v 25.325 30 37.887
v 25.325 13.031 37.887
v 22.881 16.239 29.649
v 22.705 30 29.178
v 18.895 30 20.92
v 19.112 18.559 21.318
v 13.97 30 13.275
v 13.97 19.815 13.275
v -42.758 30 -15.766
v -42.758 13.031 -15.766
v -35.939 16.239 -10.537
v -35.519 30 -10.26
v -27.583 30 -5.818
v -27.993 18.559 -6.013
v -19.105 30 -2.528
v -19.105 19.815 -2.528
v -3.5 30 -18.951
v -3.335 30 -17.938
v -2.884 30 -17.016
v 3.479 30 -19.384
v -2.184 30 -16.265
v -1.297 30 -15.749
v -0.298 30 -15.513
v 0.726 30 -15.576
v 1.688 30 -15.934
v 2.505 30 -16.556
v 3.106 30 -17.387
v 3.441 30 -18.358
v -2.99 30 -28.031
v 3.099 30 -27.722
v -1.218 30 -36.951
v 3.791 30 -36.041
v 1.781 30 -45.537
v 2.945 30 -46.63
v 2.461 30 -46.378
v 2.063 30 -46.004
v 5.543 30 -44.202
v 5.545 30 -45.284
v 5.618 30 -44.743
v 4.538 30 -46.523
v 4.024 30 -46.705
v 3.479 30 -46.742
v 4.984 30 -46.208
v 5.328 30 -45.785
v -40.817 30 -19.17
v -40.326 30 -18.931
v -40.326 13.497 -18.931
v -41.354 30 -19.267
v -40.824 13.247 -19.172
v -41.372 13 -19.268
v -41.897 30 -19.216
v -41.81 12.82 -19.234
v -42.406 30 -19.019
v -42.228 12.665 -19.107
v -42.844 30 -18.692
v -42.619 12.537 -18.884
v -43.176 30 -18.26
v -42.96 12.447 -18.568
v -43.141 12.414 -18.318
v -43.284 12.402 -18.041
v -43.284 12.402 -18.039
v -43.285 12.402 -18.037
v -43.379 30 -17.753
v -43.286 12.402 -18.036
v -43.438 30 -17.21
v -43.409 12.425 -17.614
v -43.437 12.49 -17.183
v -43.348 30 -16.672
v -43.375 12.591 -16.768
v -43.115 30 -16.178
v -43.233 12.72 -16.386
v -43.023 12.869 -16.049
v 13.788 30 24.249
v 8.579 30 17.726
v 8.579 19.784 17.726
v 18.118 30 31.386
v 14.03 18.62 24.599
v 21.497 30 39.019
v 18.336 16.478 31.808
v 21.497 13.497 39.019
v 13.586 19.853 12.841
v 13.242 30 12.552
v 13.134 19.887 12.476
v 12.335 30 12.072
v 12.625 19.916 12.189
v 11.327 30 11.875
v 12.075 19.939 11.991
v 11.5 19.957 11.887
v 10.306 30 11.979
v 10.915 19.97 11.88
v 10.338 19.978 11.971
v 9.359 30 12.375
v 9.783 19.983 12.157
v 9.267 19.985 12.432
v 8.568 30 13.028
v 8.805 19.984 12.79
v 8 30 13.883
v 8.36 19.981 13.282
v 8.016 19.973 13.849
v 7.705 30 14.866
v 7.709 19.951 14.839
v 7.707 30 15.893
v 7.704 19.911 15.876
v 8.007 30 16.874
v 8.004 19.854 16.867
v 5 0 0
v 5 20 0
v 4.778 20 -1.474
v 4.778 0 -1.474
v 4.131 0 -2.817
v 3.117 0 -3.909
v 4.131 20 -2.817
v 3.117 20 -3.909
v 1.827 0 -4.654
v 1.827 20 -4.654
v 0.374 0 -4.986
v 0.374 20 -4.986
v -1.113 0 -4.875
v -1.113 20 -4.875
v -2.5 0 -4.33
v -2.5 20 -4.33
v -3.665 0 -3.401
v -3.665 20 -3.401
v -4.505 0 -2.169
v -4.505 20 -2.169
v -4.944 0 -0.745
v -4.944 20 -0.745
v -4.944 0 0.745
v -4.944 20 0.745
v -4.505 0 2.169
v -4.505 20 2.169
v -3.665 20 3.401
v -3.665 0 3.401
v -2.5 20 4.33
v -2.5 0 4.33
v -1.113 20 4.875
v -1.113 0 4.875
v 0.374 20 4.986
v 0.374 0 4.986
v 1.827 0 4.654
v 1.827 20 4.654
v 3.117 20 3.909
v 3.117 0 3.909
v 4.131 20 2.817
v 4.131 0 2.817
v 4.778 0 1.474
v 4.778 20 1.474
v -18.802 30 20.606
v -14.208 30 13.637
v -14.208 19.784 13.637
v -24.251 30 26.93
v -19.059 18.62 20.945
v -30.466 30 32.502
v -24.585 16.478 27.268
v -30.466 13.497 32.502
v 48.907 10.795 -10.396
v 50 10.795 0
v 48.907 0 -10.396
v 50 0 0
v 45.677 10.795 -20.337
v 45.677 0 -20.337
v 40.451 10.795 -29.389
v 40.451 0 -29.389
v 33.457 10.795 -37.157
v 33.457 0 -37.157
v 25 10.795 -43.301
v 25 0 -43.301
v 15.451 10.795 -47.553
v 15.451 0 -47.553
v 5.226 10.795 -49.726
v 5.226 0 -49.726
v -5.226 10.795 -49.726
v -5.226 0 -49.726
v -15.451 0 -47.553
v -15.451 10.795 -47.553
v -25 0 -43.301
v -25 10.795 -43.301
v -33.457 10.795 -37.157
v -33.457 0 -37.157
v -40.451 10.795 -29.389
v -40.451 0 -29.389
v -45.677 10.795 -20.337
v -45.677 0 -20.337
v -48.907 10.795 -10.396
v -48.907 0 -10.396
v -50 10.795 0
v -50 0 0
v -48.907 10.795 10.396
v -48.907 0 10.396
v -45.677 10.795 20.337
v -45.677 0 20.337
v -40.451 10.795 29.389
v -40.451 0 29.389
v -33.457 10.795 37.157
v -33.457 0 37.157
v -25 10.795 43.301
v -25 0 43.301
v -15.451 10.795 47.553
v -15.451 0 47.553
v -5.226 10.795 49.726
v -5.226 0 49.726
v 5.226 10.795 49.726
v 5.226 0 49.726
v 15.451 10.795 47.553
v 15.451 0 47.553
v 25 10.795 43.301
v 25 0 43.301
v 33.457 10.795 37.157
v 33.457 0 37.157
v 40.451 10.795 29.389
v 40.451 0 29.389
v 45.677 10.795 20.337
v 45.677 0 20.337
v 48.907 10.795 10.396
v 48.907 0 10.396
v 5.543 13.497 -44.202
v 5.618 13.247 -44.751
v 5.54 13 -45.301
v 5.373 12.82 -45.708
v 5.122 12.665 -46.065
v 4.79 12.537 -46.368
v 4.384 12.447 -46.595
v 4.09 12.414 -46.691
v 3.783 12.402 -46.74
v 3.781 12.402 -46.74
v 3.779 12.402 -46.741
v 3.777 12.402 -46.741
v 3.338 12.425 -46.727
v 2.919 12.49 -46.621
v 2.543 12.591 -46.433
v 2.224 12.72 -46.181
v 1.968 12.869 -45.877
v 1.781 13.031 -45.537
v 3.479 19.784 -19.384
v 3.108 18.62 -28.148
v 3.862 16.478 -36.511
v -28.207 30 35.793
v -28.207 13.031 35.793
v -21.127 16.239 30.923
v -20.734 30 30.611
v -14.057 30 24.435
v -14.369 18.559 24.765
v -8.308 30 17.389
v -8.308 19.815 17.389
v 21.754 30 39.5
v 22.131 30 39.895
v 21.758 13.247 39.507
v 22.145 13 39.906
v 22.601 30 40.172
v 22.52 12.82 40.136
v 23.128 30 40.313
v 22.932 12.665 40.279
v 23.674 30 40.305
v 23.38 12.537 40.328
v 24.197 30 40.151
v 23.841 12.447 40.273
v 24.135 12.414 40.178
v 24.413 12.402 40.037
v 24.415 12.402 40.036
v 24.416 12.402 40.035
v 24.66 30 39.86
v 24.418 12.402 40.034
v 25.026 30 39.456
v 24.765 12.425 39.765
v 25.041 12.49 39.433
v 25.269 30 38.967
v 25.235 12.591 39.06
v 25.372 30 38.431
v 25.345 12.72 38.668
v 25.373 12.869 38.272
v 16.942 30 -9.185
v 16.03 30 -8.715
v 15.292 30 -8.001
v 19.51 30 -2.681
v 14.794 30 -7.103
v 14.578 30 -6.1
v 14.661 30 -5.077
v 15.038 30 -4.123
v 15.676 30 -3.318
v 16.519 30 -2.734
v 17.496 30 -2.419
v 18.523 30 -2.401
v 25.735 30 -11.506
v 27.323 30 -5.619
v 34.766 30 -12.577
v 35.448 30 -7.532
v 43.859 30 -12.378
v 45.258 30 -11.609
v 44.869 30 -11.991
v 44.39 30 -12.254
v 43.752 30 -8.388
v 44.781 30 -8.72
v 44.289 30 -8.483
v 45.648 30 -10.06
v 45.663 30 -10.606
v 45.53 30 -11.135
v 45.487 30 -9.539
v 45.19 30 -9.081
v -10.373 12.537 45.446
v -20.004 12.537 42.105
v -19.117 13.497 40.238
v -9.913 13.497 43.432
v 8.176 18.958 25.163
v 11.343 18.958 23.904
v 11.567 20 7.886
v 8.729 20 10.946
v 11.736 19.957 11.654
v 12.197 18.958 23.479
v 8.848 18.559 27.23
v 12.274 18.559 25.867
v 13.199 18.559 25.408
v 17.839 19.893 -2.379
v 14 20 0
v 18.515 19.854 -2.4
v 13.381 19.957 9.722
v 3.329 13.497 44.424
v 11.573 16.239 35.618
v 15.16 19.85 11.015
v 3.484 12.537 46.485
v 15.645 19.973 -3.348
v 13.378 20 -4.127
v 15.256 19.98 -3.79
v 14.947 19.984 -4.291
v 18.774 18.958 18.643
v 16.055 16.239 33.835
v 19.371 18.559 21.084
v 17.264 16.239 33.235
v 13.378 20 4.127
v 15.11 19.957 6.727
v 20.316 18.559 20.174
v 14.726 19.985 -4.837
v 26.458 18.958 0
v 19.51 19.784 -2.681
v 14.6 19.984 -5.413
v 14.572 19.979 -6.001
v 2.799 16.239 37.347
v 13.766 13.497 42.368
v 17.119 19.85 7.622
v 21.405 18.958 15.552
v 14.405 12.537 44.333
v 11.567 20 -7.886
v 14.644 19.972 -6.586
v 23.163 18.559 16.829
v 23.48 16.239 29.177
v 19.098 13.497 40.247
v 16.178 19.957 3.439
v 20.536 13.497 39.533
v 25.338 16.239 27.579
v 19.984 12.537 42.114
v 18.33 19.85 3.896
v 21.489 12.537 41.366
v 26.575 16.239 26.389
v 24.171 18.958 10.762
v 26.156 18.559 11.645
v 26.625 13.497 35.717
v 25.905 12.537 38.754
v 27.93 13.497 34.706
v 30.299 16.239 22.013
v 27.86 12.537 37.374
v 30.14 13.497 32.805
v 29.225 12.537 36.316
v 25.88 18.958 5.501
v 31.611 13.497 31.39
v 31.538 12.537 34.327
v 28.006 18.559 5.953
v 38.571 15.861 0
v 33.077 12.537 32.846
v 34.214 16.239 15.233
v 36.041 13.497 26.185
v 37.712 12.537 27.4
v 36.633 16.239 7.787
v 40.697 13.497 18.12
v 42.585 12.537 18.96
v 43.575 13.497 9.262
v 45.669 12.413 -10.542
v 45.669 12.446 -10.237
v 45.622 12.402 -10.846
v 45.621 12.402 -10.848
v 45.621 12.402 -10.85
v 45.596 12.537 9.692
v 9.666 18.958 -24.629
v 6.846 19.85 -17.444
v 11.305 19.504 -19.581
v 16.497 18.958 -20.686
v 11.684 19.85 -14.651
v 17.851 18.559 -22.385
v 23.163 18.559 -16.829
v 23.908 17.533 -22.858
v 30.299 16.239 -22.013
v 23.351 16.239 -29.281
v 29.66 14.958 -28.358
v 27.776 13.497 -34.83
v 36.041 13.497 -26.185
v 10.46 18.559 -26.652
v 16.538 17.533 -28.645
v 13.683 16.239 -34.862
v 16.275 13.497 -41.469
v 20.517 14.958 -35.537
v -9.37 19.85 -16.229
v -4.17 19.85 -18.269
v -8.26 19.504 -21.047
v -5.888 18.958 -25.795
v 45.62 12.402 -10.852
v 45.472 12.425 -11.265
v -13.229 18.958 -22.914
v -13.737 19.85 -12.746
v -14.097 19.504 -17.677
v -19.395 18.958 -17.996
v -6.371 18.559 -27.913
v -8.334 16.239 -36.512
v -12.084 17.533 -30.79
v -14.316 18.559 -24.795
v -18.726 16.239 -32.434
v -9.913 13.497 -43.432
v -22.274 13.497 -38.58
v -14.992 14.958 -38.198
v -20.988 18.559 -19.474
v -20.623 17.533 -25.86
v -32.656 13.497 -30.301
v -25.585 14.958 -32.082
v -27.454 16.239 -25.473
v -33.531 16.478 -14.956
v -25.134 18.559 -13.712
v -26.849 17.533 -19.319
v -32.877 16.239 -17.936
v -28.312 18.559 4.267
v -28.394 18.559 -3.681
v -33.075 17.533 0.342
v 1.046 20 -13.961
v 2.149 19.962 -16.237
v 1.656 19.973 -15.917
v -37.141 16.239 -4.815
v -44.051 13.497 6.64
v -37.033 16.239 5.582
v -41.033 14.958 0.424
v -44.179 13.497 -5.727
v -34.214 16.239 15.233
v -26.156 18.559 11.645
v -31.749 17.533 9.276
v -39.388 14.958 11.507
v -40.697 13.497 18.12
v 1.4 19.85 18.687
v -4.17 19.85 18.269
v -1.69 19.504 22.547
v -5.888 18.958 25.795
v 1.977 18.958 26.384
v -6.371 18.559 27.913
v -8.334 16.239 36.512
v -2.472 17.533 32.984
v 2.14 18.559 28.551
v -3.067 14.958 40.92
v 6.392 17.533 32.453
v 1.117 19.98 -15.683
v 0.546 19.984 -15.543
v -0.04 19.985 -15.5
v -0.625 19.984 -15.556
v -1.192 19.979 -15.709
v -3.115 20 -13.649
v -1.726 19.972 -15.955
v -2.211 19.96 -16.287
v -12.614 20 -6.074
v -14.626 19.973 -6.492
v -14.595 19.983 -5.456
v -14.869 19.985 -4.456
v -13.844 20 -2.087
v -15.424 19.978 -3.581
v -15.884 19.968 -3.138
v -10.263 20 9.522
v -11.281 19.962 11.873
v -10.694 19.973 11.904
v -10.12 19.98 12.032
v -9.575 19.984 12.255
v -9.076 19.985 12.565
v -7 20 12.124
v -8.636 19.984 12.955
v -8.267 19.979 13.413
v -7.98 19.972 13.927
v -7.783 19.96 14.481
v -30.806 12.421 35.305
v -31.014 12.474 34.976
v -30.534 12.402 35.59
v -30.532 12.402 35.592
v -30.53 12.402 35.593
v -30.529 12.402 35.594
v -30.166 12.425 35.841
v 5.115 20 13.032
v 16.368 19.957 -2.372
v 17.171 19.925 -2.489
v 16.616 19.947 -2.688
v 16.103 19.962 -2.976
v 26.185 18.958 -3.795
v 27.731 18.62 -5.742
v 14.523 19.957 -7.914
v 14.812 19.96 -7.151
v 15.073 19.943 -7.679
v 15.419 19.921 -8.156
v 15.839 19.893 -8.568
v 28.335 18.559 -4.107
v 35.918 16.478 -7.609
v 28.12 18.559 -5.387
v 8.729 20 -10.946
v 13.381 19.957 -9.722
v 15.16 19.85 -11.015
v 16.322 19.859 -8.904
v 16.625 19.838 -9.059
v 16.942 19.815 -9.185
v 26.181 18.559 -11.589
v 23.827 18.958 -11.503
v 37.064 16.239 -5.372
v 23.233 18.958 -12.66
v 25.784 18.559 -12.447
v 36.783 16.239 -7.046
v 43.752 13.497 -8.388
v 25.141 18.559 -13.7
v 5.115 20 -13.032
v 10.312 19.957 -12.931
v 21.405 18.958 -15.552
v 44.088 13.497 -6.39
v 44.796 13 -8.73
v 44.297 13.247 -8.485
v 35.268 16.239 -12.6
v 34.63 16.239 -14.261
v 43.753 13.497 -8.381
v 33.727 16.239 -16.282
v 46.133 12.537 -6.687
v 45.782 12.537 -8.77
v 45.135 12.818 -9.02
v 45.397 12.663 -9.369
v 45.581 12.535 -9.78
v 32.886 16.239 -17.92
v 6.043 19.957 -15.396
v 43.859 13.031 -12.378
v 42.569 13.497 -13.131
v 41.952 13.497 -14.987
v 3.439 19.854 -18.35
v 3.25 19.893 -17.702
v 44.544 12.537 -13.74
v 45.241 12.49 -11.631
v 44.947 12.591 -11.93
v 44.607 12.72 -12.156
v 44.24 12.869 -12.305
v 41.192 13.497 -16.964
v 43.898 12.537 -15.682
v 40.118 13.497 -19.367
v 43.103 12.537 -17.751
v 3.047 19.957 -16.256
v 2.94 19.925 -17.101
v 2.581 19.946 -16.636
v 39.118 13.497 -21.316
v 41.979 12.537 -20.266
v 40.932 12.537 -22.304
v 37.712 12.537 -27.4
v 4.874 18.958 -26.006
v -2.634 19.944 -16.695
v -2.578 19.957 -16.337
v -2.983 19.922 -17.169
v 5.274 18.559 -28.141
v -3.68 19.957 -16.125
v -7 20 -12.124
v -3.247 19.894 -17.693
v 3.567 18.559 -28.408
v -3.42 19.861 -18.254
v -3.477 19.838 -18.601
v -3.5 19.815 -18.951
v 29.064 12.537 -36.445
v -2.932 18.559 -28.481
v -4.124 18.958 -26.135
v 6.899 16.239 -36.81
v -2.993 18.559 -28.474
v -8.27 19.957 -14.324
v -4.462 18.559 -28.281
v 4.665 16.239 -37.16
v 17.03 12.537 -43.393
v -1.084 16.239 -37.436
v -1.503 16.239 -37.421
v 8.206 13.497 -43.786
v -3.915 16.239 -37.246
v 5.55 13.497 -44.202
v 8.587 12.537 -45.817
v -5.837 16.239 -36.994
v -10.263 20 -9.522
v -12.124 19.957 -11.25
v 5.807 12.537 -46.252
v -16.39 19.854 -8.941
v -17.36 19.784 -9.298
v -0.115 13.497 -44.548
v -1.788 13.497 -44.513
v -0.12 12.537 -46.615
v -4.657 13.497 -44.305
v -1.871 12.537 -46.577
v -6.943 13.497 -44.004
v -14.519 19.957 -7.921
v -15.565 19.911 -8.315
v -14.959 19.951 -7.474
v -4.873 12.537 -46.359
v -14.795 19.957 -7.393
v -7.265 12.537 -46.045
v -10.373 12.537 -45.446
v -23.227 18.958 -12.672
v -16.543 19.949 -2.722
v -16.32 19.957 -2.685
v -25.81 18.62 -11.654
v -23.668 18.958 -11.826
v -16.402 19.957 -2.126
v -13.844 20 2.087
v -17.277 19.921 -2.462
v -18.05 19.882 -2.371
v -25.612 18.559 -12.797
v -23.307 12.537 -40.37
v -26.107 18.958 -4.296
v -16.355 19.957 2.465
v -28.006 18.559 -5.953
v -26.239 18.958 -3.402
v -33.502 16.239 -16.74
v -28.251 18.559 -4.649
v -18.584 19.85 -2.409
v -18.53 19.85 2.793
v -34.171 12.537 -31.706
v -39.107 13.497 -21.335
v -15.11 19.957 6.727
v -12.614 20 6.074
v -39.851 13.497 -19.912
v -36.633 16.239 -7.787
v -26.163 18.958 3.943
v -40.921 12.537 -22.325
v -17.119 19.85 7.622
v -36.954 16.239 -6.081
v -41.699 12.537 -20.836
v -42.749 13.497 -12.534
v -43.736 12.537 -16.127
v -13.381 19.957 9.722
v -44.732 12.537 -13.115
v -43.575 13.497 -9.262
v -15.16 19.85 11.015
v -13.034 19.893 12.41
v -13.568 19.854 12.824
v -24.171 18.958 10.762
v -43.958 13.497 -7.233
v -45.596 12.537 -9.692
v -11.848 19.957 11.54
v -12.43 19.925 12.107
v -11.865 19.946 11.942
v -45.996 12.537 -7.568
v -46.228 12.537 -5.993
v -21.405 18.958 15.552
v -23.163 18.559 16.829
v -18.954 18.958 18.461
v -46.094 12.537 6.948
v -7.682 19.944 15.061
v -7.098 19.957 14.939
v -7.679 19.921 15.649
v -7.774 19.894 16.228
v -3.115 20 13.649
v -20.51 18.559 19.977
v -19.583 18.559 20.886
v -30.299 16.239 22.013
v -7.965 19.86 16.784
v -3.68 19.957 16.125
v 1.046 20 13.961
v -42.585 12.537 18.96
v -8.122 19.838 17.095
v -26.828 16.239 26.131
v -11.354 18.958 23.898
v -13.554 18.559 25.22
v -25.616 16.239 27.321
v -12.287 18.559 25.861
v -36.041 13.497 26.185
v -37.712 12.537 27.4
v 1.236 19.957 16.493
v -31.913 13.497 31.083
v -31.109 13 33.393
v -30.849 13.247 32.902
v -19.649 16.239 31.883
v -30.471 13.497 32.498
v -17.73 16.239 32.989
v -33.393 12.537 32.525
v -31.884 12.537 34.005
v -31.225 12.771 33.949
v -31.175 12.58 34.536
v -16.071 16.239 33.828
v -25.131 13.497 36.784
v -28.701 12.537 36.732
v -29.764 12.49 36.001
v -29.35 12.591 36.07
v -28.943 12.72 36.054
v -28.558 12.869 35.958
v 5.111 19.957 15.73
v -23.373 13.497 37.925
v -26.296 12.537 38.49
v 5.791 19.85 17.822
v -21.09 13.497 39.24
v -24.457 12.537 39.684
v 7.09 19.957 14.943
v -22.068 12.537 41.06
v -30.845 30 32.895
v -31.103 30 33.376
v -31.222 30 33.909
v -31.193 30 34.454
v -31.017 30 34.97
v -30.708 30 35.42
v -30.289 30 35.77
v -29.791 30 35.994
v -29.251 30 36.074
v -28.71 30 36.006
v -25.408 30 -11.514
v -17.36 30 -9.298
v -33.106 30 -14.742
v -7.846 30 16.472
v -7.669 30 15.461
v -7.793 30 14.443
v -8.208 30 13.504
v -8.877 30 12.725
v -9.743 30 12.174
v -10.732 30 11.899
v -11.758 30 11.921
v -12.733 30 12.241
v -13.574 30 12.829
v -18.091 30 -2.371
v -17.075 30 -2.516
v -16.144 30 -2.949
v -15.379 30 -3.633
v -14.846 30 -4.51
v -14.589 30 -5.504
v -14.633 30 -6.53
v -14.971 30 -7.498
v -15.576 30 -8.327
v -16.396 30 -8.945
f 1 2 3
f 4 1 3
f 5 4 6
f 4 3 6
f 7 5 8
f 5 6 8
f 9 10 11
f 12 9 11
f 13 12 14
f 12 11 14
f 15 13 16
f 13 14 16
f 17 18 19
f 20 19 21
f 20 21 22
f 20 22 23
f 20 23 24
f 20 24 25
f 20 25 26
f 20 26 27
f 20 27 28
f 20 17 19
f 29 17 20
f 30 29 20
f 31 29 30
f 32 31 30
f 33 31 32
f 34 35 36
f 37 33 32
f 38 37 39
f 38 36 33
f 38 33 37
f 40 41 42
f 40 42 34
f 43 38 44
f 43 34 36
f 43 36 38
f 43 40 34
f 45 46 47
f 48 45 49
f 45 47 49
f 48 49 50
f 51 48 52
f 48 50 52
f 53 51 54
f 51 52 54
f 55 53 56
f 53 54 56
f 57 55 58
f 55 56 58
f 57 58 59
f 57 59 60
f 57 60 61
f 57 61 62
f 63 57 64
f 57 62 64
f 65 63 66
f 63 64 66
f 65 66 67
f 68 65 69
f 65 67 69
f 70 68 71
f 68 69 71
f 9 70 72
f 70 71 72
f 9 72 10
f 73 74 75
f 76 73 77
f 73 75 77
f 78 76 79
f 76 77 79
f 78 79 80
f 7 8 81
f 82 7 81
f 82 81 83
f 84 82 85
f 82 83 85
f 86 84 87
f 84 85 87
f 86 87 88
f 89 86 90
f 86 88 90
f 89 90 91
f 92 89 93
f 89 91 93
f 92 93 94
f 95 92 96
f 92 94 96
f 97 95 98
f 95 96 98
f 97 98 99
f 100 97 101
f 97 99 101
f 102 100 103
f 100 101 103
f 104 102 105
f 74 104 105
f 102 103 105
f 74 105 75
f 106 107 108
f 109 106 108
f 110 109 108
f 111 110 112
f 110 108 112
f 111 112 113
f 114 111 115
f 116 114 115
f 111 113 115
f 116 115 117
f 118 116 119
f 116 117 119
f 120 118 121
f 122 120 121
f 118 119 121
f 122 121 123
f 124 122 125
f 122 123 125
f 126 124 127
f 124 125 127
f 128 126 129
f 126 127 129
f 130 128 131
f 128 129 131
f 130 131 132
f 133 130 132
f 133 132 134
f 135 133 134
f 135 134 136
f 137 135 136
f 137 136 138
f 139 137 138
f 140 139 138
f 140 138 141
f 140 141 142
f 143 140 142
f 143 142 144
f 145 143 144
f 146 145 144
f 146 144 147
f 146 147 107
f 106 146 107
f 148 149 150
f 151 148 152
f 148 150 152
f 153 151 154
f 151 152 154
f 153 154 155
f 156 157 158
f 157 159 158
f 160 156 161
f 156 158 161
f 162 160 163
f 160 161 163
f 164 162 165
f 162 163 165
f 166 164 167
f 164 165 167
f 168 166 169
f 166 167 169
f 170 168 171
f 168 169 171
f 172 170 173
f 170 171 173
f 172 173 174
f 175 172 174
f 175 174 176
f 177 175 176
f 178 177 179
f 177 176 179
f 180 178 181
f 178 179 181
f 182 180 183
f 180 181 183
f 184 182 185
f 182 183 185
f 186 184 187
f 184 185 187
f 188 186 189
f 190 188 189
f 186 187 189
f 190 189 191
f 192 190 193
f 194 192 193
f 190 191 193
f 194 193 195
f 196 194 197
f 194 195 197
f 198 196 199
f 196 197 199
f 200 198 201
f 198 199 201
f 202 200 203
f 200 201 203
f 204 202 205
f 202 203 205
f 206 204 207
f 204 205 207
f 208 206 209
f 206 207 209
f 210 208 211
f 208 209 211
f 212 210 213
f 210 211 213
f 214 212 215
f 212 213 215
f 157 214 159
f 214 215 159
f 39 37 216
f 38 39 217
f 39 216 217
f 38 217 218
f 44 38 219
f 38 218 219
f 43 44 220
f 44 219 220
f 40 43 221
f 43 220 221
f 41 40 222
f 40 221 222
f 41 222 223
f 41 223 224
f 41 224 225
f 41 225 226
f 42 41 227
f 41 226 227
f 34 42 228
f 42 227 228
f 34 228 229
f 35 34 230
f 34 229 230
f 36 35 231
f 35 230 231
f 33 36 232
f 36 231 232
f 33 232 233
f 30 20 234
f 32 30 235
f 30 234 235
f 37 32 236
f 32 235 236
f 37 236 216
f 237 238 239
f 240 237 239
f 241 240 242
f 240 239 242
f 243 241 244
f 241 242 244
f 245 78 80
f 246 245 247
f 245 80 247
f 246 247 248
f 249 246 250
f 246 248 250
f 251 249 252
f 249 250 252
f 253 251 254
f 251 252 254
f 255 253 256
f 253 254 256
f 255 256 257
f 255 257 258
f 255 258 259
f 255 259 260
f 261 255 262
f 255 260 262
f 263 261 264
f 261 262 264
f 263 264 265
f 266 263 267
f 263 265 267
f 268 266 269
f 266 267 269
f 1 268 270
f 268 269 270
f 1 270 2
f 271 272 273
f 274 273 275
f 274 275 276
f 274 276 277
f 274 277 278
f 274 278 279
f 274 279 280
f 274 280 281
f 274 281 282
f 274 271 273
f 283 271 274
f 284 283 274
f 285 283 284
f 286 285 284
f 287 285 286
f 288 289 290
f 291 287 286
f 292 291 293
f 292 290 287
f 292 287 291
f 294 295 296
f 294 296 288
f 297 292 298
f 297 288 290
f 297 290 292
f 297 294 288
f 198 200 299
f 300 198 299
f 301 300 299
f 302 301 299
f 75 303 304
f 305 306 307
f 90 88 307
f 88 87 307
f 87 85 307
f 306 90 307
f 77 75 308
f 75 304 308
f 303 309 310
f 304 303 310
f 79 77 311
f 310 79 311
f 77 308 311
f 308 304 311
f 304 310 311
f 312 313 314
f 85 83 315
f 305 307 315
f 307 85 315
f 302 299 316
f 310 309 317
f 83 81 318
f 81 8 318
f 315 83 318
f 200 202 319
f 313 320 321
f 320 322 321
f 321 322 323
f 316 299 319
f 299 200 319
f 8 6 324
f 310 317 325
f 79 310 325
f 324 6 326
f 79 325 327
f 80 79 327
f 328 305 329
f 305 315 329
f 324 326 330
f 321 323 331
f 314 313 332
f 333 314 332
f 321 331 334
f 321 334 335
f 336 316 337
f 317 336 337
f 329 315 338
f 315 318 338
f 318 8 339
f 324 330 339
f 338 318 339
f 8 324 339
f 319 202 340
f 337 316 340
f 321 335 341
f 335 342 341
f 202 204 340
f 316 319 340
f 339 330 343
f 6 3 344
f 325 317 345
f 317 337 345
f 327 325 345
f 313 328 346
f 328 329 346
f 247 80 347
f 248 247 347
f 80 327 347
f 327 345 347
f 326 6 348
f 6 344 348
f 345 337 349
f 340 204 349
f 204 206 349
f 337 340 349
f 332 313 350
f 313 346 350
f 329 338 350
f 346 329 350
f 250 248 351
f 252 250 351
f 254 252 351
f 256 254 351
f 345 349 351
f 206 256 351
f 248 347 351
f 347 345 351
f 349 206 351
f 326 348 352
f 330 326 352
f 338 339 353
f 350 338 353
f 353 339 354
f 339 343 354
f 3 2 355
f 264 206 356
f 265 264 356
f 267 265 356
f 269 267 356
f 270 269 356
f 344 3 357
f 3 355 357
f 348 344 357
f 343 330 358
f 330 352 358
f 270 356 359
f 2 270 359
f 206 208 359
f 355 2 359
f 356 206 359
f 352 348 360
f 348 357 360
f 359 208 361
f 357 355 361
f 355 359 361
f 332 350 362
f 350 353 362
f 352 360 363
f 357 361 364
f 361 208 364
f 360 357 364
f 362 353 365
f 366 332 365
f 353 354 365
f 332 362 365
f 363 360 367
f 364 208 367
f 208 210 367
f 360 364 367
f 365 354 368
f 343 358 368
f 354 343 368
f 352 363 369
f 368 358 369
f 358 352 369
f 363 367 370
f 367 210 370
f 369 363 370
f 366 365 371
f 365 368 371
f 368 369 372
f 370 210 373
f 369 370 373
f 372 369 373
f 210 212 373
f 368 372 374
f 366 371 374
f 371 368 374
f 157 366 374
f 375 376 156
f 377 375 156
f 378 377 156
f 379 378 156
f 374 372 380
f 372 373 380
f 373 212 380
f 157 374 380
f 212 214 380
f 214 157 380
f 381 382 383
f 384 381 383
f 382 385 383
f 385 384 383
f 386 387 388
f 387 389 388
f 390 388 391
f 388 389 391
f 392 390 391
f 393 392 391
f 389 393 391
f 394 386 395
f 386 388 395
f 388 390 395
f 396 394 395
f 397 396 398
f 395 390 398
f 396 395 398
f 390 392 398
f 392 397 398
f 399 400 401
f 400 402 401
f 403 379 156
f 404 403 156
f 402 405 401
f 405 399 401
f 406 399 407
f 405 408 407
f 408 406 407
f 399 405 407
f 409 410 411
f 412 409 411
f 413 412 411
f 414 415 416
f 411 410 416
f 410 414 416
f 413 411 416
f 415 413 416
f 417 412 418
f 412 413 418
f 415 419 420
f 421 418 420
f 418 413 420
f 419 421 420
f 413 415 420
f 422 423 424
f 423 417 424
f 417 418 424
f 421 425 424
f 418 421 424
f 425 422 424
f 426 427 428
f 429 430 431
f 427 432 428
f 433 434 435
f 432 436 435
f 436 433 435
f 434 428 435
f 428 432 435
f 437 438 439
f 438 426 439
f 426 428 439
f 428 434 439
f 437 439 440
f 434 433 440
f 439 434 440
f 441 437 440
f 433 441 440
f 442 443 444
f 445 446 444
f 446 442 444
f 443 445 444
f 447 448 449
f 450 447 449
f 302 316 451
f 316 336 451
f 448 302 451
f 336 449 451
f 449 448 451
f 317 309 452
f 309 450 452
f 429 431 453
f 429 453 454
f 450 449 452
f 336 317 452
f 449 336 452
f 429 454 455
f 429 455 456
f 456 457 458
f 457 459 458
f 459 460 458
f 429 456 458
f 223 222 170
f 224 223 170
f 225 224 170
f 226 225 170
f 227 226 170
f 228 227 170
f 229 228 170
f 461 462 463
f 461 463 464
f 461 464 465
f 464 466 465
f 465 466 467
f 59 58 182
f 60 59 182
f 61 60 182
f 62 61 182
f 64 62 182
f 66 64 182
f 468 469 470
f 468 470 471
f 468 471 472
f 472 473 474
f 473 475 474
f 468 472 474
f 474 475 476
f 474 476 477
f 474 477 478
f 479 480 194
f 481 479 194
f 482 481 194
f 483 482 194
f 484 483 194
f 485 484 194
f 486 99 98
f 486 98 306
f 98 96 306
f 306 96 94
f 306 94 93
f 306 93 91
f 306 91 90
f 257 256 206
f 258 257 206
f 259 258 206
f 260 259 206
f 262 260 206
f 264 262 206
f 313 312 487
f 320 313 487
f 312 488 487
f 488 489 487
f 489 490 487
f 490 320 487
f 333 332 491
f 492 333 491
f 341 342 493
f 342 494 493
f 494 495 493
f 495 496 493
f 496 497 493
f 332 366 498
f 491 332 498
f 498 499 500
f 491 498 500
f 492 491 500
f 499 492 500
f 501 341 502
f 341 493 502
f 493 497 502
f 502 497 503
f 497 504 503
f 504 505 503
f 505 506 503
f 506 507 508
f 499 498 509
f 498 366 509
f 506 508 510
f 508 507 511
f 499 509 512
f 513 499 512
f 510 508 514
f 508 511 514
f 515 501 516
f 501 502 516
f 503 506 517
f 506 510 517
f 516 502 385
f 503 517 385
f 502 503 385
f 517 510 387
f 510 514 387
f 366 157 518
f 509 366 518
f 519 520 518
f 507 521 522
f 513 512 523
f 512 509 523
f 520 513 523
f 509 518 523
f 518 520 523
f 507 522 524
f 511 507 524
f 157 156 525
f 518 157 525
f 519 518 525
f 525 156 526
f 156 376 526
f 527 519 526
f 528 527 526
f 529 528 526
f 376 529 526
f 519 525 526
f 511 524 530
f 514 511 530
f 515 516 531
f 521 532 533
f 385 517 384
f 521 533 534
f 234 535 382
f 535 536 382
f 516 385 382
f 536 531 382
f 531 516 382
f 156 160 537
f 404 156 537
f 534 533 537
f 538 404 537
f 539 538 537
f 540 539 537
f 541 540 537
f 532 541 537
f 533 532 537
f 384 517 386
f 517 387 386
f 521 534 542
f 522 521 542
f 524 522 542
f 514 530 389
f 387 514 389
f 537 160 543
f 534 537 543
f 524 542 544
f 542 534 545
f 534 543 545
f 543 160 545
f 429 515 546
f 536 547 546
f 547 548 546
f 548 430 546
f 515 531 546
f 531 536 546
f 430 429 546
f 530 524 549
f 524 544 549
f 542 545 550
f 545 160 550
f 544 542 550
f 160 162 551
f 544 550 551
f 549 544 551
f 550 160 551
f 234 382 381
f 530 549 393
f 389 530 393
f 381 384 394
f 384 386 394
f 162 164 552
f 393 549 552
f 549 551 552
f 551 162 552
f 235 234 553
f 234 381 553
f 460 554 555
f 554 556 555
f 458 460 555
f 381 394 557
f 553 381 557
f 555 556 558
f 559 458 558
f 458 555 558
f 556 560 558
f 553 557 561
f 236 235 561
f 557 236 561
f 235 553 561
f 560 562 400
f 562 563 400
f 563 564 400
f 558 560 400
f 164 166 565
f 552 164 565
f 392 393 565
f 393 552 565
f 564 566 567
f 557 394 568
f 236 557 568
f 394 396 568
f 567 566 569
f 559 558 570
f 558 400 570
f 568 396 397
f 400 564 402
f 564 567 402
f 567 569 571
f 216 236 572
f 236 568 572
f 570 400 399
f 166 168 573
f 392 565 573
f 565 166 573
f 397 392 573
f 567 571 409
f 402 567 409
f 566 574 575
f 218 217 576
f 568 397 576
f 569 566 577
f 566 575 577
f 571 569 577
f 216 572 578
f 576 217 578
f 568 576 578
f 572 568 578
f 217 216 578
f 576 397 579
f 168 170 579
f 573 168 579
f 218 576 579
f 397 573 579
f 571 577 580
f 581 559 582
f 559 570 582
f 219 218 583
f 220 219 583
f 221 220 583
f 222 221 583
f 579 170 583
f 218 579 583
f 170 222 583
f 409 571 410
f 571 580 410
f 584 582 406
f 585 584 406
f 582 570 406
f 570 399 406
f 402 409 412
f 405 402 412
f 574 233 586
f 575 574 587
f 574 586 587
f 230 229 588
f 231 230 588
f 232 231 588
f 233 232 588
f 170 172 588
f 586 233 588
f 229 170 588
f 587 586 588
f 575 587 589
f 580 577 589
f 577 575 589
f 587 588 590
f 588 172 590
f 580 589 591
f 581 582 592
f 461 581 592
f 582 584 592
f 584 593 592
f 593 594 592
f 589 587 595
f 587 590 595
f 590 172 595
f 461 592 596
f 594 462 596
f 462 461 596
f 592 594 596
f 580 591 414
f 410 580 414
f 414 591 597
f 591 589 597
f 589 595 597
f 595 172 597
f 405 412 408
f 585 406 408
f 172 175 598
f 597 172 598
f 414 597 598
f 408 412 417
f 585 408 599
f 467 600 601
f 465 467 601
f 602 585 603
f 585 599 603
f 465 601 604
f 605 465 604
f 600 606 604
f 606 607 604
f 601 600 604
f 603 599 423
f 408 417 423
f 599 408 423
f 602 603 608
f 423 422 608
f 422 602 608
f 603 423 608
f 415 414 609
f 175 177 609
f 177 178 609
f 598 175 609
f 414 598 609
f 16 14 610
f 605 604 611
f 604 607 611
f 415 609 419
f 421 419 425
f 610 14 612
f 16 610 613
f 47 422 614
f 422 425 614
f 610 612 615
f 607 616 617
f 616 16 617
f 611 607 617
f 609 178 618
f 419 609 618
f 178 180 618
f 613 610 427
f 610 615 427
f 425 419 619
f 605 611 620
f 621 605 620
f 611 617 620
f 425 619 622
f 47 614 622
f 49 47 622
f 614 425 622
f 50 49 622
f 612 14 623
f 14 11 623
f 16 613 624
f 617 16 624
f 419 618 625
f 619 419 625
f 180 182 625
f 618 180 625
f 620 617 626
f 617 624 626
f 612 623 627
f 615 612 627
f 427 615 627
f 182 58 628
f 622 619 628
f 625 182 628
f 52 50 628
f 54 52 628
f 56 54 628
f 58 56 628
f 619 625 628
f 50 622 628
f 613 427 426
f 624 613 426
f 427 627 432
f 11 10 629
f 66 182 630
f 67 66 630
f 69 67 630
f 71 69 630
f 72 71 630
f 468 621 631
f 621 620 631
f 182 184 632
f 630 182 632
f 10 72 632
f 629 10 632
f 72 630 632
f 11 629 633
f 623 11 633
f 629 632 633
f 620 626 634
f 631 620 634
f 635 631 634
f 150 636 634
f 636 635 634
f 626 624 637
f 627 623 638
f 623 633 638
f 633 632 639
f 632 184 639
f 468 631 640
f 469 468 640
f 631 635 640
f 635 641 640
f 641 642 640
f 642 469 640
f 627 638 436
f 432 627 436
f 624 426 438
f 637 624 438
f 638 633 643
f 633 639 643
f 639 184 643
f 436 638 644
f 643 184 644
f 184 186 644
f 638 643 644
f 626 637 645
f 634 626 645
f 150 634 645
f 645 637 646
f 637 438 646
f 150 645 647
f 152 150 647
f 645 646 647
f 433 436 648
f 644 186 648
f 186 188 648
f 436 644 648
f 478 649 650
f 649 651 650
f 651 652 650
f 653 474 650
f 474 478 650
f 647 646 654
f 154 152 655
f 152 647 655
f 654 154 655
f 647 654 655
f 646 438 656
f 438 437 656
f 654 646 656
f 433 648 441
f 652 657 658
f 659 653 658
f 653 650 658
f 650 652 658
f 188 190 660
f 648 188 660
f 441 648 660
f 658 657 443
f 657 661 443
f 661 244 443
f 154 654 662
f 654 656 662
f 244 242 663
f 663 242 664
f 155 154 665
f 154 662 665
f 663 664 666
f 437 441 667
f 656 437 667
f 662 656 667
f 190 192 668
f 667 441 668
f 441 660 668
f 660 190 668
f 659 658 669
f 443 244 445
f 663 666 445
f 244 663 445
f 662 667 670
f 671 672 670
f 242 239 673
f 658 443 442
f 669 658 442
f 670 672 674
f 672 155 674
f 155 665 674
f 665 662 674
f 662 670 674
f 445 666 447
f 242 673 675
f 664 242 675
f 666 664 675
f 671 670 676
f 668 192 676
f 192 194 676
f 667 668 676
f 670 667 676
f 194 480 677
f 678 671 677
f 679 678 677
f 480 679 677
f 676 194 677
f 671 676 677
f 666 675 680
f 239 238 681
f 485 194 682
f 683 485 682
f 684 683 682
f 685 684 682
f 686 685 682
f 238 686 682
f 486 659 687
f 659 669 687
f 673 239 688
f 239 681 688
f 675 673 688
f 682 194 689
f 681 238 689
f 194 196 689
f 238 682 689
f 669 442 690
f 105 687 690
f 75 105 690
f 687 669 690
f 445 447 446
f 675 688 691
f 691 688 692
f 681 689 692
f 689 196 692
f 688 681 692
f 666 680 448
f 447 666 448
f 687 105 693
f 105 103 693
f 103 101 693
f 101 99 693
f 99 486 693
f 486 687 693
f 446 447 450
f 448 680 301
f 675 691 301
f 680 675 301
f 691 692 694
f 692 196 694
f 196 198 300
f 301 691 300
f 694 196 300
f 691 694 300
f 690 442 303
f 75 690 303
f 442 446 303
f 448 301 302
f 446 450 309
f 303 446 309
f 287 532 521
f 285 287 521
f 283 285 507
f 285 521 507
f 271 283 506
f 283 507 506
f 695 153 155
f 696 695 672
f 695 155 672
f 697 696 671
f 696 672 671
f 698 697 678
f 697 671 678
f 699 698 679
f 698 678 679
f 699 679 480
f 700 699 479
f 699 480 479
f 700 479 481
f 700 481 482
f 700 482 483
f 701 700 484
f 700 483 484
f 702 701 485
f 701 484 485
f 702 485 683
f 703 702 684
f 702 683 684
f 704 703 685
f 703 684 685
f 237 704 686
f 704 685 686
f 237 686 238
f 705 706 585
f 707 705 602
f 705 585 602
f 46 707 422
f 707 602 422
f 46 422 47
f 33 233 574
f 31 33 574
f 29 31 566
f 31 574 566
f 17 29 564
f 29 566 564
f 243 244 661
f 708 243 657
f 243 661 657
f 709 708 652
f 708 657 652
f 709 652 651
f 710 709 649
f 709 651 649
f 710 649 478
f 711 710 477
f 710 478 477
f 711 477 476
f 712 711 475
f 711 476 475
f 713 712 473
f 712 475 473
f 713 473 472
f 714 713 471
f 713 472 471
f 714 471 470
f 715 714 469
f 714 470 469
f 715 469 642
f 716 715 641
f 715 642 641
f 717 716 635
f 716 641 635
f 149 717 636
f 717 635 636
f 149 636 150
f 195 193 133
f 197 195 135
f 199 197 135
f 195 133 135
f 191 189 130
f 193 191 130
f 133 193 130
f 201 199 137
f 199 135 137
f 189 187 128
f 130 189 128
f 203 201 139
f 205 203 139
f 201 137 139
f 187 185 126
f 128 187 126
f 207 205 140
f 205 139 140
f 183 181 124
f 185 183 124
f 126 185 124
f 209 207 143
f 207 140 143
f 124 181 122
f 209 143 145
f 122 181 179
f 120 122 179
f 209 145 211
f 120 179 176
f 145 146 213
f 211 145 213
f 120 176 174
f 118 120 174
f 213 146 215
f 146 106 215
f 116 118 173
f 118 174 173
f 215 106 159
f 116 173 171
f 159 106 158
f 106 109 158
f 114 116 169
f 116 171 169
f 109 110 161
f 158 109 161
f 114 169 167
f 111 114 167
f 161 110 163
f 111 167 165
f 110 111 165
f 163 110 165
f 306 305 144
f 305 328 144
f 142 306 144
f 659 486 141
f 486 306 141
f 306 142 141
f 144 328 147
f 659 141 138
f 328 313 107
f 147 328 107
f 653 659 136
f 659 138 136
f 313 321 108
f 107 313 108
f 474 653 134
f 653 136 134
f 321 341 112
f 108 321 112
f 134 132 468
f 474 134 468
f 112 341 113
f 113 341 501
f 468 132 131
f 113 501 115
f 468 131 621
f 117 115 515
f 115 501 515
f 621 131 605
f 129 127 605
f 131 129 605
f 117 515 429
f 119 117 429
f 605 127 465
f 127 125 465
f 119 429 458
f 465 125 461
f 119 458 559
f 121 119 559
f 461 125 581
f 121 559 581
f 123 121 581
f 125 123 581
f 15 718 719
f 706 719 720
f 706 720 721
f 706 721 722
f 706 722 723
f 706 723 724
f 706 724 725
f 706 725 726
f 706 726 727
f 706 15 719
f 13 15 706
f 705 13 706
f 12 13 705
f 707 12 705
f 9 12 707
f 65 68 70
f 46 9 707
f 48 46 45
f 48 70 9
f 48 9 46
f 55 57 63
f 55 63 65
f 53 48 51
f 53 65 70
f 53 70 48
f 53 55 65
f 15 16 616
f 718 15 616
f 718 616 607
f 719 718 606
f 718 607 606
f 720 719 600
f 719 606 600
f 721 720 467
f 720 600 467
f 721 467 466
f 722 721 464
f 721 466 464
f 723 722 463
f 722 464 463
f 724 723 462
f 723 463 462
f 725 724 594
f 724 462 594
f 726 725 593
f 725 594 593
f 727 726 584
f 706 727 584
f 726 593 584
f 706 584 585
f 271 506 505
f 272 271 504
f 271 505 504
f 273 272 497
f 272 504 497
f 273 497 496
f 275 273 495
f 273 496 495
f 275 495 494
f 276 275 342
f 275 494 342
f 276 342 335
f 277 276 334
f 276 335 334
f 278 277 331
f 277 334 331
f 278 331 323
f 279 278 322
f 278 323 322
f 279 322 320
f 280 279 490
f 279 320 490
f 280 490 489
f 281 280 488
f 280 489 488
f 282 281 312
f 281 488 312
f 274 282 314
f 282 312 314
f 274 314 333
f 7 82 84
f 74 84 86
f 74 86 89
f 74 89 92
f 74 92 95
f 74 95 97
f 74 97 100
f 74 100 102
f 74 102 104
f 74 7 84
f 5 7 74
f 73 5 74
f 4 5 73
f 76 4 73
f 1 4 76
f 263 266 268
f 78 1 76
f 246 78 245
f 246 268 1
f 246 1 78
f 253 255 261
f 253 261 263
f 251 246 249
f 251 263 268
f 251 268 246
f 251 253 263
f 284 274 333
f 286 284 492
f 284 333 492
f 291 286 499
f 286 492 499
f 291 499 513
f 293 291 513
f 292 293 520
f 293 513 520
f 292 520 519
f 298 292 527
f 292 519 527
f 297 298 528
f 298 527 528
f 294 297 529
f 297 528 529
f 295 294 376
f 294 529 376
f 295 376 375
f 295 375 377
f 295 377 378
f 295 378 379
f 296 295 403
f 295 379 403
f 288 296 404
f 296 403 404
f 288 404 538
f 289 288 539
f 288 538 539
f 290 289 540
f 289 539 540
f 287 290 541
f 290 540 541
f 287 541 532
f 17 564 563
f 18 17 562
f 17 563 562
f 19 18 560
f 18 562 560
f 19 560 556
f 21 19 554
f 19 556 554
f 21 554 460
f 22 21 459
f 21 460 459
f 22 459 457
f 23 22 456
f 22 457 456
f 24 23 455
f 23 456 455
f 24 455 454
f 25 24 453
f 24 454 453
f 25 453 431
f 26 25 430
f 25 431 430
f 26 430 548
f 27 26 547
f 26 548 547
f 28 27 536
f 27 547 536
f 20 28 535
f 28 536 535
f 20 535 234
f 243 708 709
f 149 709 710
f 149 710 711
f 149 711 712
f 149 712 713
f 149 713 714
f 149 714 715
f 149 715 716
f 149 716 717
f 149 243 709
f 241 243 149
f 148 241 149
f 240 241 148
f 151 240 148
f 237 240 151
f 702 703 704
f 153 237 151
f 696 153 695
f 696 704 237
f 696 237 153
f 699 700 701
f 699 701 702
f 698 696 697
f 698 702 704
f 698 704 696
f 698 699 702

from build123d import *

# Parameters (mm, degrees)
ODEBRAT_VYSUNUT_M1_REACH = 22
SKICA2_R                 = 5
P_IDAT_START             = -7.597862
P_IDAT_VYSUNUT_M1_DEPTH  = 17.597862
KRUHOV_POLE1_COUNT       = 5


with BuildPart() as part:
    # Skica1 → Rotovat1 (revolve)
    with BuildSketch(Plane.XY):
        with BuildLine():
            Line((0, 0), (0, 20))
            Line((0, 20), (14, 20))
            ThreePointArc((14, 20), (32.579084411, 17.662353543), (50, 10.795136598))
            Line((50, 10.795136598), (50, 0))
            Line((50, 0), (0, 0))
        make_face()
    revolve(axis=Axis((0, 0, 0), (0, 1, 0)))

    # Skica2 → Odebrat vysunutím1 (cut, up to next)
    with BuildSketch(Plane(origin=(0, 20, 0), x_dir=(1, 0, 0), z_dir=(0, 1, 0)), mode=Mode.PRIVATE) as odebrat_vysunut_m1_sk1:
        Circle(SKICA2_R)
    odebrat_vysunut_m1_tool1 = extrude(odebrat_vysunut_m1_sk1.sketch, amount=-ODEBRAT_VYSUNUT_M1_REACH, mode=Mode.PRIVATE) & part.part
    add(odebrat_vysunut_m1_tool1.solids().sort_by_distance((0, 20, 0))[0], mode=Mode.SUBTRACT)

    # Skica3 → Přidat vysunutím1 (add)
    with BuildSketch(Plane(origin=(0, 20, 0), x_dir=(1, 0, 0), z_dir=(0, 1, 0)).offset(P_IDAT_START)):
        with BuildLine():
            ThreePointArc((5.542949714, 44.202455598), (4.287230231, 46.631857241), (1.78118303, 45.537073612))
            ThreePointArc((1.78118303, 45.537073612), (-2.260445719, 32.522428192), (-3.499658814, 18.951130934))
            ThreePointArc((-3.499658814, 18.951130934), (0.216435534, 15.506698459), (3.478925663, 19.383505191))
            ThreePointArc((3.478925663, 19.383505191), (3.31115986, 31.892757792), (5.542949714, 44.202455598))
        make_face()
    p_idat_vysunut_m1 = extrude(amount=P_IDAT_VYSUNUT_M1_DEPTH)

    # Kruhové pole1: Přidat vysunutím1 ×5 about axis
    kruhov_pole1_axis = Axis((0, 0, 0), (0, 1, 0))
    for i in range(1, KRUHOV_POLE1_COUNT):
        add(p_idat_vysunut_m1.rotate(kruhov_pole1_axis, i * 360 / KRUHOV_POLE1_COUNT))


solid = part.part
